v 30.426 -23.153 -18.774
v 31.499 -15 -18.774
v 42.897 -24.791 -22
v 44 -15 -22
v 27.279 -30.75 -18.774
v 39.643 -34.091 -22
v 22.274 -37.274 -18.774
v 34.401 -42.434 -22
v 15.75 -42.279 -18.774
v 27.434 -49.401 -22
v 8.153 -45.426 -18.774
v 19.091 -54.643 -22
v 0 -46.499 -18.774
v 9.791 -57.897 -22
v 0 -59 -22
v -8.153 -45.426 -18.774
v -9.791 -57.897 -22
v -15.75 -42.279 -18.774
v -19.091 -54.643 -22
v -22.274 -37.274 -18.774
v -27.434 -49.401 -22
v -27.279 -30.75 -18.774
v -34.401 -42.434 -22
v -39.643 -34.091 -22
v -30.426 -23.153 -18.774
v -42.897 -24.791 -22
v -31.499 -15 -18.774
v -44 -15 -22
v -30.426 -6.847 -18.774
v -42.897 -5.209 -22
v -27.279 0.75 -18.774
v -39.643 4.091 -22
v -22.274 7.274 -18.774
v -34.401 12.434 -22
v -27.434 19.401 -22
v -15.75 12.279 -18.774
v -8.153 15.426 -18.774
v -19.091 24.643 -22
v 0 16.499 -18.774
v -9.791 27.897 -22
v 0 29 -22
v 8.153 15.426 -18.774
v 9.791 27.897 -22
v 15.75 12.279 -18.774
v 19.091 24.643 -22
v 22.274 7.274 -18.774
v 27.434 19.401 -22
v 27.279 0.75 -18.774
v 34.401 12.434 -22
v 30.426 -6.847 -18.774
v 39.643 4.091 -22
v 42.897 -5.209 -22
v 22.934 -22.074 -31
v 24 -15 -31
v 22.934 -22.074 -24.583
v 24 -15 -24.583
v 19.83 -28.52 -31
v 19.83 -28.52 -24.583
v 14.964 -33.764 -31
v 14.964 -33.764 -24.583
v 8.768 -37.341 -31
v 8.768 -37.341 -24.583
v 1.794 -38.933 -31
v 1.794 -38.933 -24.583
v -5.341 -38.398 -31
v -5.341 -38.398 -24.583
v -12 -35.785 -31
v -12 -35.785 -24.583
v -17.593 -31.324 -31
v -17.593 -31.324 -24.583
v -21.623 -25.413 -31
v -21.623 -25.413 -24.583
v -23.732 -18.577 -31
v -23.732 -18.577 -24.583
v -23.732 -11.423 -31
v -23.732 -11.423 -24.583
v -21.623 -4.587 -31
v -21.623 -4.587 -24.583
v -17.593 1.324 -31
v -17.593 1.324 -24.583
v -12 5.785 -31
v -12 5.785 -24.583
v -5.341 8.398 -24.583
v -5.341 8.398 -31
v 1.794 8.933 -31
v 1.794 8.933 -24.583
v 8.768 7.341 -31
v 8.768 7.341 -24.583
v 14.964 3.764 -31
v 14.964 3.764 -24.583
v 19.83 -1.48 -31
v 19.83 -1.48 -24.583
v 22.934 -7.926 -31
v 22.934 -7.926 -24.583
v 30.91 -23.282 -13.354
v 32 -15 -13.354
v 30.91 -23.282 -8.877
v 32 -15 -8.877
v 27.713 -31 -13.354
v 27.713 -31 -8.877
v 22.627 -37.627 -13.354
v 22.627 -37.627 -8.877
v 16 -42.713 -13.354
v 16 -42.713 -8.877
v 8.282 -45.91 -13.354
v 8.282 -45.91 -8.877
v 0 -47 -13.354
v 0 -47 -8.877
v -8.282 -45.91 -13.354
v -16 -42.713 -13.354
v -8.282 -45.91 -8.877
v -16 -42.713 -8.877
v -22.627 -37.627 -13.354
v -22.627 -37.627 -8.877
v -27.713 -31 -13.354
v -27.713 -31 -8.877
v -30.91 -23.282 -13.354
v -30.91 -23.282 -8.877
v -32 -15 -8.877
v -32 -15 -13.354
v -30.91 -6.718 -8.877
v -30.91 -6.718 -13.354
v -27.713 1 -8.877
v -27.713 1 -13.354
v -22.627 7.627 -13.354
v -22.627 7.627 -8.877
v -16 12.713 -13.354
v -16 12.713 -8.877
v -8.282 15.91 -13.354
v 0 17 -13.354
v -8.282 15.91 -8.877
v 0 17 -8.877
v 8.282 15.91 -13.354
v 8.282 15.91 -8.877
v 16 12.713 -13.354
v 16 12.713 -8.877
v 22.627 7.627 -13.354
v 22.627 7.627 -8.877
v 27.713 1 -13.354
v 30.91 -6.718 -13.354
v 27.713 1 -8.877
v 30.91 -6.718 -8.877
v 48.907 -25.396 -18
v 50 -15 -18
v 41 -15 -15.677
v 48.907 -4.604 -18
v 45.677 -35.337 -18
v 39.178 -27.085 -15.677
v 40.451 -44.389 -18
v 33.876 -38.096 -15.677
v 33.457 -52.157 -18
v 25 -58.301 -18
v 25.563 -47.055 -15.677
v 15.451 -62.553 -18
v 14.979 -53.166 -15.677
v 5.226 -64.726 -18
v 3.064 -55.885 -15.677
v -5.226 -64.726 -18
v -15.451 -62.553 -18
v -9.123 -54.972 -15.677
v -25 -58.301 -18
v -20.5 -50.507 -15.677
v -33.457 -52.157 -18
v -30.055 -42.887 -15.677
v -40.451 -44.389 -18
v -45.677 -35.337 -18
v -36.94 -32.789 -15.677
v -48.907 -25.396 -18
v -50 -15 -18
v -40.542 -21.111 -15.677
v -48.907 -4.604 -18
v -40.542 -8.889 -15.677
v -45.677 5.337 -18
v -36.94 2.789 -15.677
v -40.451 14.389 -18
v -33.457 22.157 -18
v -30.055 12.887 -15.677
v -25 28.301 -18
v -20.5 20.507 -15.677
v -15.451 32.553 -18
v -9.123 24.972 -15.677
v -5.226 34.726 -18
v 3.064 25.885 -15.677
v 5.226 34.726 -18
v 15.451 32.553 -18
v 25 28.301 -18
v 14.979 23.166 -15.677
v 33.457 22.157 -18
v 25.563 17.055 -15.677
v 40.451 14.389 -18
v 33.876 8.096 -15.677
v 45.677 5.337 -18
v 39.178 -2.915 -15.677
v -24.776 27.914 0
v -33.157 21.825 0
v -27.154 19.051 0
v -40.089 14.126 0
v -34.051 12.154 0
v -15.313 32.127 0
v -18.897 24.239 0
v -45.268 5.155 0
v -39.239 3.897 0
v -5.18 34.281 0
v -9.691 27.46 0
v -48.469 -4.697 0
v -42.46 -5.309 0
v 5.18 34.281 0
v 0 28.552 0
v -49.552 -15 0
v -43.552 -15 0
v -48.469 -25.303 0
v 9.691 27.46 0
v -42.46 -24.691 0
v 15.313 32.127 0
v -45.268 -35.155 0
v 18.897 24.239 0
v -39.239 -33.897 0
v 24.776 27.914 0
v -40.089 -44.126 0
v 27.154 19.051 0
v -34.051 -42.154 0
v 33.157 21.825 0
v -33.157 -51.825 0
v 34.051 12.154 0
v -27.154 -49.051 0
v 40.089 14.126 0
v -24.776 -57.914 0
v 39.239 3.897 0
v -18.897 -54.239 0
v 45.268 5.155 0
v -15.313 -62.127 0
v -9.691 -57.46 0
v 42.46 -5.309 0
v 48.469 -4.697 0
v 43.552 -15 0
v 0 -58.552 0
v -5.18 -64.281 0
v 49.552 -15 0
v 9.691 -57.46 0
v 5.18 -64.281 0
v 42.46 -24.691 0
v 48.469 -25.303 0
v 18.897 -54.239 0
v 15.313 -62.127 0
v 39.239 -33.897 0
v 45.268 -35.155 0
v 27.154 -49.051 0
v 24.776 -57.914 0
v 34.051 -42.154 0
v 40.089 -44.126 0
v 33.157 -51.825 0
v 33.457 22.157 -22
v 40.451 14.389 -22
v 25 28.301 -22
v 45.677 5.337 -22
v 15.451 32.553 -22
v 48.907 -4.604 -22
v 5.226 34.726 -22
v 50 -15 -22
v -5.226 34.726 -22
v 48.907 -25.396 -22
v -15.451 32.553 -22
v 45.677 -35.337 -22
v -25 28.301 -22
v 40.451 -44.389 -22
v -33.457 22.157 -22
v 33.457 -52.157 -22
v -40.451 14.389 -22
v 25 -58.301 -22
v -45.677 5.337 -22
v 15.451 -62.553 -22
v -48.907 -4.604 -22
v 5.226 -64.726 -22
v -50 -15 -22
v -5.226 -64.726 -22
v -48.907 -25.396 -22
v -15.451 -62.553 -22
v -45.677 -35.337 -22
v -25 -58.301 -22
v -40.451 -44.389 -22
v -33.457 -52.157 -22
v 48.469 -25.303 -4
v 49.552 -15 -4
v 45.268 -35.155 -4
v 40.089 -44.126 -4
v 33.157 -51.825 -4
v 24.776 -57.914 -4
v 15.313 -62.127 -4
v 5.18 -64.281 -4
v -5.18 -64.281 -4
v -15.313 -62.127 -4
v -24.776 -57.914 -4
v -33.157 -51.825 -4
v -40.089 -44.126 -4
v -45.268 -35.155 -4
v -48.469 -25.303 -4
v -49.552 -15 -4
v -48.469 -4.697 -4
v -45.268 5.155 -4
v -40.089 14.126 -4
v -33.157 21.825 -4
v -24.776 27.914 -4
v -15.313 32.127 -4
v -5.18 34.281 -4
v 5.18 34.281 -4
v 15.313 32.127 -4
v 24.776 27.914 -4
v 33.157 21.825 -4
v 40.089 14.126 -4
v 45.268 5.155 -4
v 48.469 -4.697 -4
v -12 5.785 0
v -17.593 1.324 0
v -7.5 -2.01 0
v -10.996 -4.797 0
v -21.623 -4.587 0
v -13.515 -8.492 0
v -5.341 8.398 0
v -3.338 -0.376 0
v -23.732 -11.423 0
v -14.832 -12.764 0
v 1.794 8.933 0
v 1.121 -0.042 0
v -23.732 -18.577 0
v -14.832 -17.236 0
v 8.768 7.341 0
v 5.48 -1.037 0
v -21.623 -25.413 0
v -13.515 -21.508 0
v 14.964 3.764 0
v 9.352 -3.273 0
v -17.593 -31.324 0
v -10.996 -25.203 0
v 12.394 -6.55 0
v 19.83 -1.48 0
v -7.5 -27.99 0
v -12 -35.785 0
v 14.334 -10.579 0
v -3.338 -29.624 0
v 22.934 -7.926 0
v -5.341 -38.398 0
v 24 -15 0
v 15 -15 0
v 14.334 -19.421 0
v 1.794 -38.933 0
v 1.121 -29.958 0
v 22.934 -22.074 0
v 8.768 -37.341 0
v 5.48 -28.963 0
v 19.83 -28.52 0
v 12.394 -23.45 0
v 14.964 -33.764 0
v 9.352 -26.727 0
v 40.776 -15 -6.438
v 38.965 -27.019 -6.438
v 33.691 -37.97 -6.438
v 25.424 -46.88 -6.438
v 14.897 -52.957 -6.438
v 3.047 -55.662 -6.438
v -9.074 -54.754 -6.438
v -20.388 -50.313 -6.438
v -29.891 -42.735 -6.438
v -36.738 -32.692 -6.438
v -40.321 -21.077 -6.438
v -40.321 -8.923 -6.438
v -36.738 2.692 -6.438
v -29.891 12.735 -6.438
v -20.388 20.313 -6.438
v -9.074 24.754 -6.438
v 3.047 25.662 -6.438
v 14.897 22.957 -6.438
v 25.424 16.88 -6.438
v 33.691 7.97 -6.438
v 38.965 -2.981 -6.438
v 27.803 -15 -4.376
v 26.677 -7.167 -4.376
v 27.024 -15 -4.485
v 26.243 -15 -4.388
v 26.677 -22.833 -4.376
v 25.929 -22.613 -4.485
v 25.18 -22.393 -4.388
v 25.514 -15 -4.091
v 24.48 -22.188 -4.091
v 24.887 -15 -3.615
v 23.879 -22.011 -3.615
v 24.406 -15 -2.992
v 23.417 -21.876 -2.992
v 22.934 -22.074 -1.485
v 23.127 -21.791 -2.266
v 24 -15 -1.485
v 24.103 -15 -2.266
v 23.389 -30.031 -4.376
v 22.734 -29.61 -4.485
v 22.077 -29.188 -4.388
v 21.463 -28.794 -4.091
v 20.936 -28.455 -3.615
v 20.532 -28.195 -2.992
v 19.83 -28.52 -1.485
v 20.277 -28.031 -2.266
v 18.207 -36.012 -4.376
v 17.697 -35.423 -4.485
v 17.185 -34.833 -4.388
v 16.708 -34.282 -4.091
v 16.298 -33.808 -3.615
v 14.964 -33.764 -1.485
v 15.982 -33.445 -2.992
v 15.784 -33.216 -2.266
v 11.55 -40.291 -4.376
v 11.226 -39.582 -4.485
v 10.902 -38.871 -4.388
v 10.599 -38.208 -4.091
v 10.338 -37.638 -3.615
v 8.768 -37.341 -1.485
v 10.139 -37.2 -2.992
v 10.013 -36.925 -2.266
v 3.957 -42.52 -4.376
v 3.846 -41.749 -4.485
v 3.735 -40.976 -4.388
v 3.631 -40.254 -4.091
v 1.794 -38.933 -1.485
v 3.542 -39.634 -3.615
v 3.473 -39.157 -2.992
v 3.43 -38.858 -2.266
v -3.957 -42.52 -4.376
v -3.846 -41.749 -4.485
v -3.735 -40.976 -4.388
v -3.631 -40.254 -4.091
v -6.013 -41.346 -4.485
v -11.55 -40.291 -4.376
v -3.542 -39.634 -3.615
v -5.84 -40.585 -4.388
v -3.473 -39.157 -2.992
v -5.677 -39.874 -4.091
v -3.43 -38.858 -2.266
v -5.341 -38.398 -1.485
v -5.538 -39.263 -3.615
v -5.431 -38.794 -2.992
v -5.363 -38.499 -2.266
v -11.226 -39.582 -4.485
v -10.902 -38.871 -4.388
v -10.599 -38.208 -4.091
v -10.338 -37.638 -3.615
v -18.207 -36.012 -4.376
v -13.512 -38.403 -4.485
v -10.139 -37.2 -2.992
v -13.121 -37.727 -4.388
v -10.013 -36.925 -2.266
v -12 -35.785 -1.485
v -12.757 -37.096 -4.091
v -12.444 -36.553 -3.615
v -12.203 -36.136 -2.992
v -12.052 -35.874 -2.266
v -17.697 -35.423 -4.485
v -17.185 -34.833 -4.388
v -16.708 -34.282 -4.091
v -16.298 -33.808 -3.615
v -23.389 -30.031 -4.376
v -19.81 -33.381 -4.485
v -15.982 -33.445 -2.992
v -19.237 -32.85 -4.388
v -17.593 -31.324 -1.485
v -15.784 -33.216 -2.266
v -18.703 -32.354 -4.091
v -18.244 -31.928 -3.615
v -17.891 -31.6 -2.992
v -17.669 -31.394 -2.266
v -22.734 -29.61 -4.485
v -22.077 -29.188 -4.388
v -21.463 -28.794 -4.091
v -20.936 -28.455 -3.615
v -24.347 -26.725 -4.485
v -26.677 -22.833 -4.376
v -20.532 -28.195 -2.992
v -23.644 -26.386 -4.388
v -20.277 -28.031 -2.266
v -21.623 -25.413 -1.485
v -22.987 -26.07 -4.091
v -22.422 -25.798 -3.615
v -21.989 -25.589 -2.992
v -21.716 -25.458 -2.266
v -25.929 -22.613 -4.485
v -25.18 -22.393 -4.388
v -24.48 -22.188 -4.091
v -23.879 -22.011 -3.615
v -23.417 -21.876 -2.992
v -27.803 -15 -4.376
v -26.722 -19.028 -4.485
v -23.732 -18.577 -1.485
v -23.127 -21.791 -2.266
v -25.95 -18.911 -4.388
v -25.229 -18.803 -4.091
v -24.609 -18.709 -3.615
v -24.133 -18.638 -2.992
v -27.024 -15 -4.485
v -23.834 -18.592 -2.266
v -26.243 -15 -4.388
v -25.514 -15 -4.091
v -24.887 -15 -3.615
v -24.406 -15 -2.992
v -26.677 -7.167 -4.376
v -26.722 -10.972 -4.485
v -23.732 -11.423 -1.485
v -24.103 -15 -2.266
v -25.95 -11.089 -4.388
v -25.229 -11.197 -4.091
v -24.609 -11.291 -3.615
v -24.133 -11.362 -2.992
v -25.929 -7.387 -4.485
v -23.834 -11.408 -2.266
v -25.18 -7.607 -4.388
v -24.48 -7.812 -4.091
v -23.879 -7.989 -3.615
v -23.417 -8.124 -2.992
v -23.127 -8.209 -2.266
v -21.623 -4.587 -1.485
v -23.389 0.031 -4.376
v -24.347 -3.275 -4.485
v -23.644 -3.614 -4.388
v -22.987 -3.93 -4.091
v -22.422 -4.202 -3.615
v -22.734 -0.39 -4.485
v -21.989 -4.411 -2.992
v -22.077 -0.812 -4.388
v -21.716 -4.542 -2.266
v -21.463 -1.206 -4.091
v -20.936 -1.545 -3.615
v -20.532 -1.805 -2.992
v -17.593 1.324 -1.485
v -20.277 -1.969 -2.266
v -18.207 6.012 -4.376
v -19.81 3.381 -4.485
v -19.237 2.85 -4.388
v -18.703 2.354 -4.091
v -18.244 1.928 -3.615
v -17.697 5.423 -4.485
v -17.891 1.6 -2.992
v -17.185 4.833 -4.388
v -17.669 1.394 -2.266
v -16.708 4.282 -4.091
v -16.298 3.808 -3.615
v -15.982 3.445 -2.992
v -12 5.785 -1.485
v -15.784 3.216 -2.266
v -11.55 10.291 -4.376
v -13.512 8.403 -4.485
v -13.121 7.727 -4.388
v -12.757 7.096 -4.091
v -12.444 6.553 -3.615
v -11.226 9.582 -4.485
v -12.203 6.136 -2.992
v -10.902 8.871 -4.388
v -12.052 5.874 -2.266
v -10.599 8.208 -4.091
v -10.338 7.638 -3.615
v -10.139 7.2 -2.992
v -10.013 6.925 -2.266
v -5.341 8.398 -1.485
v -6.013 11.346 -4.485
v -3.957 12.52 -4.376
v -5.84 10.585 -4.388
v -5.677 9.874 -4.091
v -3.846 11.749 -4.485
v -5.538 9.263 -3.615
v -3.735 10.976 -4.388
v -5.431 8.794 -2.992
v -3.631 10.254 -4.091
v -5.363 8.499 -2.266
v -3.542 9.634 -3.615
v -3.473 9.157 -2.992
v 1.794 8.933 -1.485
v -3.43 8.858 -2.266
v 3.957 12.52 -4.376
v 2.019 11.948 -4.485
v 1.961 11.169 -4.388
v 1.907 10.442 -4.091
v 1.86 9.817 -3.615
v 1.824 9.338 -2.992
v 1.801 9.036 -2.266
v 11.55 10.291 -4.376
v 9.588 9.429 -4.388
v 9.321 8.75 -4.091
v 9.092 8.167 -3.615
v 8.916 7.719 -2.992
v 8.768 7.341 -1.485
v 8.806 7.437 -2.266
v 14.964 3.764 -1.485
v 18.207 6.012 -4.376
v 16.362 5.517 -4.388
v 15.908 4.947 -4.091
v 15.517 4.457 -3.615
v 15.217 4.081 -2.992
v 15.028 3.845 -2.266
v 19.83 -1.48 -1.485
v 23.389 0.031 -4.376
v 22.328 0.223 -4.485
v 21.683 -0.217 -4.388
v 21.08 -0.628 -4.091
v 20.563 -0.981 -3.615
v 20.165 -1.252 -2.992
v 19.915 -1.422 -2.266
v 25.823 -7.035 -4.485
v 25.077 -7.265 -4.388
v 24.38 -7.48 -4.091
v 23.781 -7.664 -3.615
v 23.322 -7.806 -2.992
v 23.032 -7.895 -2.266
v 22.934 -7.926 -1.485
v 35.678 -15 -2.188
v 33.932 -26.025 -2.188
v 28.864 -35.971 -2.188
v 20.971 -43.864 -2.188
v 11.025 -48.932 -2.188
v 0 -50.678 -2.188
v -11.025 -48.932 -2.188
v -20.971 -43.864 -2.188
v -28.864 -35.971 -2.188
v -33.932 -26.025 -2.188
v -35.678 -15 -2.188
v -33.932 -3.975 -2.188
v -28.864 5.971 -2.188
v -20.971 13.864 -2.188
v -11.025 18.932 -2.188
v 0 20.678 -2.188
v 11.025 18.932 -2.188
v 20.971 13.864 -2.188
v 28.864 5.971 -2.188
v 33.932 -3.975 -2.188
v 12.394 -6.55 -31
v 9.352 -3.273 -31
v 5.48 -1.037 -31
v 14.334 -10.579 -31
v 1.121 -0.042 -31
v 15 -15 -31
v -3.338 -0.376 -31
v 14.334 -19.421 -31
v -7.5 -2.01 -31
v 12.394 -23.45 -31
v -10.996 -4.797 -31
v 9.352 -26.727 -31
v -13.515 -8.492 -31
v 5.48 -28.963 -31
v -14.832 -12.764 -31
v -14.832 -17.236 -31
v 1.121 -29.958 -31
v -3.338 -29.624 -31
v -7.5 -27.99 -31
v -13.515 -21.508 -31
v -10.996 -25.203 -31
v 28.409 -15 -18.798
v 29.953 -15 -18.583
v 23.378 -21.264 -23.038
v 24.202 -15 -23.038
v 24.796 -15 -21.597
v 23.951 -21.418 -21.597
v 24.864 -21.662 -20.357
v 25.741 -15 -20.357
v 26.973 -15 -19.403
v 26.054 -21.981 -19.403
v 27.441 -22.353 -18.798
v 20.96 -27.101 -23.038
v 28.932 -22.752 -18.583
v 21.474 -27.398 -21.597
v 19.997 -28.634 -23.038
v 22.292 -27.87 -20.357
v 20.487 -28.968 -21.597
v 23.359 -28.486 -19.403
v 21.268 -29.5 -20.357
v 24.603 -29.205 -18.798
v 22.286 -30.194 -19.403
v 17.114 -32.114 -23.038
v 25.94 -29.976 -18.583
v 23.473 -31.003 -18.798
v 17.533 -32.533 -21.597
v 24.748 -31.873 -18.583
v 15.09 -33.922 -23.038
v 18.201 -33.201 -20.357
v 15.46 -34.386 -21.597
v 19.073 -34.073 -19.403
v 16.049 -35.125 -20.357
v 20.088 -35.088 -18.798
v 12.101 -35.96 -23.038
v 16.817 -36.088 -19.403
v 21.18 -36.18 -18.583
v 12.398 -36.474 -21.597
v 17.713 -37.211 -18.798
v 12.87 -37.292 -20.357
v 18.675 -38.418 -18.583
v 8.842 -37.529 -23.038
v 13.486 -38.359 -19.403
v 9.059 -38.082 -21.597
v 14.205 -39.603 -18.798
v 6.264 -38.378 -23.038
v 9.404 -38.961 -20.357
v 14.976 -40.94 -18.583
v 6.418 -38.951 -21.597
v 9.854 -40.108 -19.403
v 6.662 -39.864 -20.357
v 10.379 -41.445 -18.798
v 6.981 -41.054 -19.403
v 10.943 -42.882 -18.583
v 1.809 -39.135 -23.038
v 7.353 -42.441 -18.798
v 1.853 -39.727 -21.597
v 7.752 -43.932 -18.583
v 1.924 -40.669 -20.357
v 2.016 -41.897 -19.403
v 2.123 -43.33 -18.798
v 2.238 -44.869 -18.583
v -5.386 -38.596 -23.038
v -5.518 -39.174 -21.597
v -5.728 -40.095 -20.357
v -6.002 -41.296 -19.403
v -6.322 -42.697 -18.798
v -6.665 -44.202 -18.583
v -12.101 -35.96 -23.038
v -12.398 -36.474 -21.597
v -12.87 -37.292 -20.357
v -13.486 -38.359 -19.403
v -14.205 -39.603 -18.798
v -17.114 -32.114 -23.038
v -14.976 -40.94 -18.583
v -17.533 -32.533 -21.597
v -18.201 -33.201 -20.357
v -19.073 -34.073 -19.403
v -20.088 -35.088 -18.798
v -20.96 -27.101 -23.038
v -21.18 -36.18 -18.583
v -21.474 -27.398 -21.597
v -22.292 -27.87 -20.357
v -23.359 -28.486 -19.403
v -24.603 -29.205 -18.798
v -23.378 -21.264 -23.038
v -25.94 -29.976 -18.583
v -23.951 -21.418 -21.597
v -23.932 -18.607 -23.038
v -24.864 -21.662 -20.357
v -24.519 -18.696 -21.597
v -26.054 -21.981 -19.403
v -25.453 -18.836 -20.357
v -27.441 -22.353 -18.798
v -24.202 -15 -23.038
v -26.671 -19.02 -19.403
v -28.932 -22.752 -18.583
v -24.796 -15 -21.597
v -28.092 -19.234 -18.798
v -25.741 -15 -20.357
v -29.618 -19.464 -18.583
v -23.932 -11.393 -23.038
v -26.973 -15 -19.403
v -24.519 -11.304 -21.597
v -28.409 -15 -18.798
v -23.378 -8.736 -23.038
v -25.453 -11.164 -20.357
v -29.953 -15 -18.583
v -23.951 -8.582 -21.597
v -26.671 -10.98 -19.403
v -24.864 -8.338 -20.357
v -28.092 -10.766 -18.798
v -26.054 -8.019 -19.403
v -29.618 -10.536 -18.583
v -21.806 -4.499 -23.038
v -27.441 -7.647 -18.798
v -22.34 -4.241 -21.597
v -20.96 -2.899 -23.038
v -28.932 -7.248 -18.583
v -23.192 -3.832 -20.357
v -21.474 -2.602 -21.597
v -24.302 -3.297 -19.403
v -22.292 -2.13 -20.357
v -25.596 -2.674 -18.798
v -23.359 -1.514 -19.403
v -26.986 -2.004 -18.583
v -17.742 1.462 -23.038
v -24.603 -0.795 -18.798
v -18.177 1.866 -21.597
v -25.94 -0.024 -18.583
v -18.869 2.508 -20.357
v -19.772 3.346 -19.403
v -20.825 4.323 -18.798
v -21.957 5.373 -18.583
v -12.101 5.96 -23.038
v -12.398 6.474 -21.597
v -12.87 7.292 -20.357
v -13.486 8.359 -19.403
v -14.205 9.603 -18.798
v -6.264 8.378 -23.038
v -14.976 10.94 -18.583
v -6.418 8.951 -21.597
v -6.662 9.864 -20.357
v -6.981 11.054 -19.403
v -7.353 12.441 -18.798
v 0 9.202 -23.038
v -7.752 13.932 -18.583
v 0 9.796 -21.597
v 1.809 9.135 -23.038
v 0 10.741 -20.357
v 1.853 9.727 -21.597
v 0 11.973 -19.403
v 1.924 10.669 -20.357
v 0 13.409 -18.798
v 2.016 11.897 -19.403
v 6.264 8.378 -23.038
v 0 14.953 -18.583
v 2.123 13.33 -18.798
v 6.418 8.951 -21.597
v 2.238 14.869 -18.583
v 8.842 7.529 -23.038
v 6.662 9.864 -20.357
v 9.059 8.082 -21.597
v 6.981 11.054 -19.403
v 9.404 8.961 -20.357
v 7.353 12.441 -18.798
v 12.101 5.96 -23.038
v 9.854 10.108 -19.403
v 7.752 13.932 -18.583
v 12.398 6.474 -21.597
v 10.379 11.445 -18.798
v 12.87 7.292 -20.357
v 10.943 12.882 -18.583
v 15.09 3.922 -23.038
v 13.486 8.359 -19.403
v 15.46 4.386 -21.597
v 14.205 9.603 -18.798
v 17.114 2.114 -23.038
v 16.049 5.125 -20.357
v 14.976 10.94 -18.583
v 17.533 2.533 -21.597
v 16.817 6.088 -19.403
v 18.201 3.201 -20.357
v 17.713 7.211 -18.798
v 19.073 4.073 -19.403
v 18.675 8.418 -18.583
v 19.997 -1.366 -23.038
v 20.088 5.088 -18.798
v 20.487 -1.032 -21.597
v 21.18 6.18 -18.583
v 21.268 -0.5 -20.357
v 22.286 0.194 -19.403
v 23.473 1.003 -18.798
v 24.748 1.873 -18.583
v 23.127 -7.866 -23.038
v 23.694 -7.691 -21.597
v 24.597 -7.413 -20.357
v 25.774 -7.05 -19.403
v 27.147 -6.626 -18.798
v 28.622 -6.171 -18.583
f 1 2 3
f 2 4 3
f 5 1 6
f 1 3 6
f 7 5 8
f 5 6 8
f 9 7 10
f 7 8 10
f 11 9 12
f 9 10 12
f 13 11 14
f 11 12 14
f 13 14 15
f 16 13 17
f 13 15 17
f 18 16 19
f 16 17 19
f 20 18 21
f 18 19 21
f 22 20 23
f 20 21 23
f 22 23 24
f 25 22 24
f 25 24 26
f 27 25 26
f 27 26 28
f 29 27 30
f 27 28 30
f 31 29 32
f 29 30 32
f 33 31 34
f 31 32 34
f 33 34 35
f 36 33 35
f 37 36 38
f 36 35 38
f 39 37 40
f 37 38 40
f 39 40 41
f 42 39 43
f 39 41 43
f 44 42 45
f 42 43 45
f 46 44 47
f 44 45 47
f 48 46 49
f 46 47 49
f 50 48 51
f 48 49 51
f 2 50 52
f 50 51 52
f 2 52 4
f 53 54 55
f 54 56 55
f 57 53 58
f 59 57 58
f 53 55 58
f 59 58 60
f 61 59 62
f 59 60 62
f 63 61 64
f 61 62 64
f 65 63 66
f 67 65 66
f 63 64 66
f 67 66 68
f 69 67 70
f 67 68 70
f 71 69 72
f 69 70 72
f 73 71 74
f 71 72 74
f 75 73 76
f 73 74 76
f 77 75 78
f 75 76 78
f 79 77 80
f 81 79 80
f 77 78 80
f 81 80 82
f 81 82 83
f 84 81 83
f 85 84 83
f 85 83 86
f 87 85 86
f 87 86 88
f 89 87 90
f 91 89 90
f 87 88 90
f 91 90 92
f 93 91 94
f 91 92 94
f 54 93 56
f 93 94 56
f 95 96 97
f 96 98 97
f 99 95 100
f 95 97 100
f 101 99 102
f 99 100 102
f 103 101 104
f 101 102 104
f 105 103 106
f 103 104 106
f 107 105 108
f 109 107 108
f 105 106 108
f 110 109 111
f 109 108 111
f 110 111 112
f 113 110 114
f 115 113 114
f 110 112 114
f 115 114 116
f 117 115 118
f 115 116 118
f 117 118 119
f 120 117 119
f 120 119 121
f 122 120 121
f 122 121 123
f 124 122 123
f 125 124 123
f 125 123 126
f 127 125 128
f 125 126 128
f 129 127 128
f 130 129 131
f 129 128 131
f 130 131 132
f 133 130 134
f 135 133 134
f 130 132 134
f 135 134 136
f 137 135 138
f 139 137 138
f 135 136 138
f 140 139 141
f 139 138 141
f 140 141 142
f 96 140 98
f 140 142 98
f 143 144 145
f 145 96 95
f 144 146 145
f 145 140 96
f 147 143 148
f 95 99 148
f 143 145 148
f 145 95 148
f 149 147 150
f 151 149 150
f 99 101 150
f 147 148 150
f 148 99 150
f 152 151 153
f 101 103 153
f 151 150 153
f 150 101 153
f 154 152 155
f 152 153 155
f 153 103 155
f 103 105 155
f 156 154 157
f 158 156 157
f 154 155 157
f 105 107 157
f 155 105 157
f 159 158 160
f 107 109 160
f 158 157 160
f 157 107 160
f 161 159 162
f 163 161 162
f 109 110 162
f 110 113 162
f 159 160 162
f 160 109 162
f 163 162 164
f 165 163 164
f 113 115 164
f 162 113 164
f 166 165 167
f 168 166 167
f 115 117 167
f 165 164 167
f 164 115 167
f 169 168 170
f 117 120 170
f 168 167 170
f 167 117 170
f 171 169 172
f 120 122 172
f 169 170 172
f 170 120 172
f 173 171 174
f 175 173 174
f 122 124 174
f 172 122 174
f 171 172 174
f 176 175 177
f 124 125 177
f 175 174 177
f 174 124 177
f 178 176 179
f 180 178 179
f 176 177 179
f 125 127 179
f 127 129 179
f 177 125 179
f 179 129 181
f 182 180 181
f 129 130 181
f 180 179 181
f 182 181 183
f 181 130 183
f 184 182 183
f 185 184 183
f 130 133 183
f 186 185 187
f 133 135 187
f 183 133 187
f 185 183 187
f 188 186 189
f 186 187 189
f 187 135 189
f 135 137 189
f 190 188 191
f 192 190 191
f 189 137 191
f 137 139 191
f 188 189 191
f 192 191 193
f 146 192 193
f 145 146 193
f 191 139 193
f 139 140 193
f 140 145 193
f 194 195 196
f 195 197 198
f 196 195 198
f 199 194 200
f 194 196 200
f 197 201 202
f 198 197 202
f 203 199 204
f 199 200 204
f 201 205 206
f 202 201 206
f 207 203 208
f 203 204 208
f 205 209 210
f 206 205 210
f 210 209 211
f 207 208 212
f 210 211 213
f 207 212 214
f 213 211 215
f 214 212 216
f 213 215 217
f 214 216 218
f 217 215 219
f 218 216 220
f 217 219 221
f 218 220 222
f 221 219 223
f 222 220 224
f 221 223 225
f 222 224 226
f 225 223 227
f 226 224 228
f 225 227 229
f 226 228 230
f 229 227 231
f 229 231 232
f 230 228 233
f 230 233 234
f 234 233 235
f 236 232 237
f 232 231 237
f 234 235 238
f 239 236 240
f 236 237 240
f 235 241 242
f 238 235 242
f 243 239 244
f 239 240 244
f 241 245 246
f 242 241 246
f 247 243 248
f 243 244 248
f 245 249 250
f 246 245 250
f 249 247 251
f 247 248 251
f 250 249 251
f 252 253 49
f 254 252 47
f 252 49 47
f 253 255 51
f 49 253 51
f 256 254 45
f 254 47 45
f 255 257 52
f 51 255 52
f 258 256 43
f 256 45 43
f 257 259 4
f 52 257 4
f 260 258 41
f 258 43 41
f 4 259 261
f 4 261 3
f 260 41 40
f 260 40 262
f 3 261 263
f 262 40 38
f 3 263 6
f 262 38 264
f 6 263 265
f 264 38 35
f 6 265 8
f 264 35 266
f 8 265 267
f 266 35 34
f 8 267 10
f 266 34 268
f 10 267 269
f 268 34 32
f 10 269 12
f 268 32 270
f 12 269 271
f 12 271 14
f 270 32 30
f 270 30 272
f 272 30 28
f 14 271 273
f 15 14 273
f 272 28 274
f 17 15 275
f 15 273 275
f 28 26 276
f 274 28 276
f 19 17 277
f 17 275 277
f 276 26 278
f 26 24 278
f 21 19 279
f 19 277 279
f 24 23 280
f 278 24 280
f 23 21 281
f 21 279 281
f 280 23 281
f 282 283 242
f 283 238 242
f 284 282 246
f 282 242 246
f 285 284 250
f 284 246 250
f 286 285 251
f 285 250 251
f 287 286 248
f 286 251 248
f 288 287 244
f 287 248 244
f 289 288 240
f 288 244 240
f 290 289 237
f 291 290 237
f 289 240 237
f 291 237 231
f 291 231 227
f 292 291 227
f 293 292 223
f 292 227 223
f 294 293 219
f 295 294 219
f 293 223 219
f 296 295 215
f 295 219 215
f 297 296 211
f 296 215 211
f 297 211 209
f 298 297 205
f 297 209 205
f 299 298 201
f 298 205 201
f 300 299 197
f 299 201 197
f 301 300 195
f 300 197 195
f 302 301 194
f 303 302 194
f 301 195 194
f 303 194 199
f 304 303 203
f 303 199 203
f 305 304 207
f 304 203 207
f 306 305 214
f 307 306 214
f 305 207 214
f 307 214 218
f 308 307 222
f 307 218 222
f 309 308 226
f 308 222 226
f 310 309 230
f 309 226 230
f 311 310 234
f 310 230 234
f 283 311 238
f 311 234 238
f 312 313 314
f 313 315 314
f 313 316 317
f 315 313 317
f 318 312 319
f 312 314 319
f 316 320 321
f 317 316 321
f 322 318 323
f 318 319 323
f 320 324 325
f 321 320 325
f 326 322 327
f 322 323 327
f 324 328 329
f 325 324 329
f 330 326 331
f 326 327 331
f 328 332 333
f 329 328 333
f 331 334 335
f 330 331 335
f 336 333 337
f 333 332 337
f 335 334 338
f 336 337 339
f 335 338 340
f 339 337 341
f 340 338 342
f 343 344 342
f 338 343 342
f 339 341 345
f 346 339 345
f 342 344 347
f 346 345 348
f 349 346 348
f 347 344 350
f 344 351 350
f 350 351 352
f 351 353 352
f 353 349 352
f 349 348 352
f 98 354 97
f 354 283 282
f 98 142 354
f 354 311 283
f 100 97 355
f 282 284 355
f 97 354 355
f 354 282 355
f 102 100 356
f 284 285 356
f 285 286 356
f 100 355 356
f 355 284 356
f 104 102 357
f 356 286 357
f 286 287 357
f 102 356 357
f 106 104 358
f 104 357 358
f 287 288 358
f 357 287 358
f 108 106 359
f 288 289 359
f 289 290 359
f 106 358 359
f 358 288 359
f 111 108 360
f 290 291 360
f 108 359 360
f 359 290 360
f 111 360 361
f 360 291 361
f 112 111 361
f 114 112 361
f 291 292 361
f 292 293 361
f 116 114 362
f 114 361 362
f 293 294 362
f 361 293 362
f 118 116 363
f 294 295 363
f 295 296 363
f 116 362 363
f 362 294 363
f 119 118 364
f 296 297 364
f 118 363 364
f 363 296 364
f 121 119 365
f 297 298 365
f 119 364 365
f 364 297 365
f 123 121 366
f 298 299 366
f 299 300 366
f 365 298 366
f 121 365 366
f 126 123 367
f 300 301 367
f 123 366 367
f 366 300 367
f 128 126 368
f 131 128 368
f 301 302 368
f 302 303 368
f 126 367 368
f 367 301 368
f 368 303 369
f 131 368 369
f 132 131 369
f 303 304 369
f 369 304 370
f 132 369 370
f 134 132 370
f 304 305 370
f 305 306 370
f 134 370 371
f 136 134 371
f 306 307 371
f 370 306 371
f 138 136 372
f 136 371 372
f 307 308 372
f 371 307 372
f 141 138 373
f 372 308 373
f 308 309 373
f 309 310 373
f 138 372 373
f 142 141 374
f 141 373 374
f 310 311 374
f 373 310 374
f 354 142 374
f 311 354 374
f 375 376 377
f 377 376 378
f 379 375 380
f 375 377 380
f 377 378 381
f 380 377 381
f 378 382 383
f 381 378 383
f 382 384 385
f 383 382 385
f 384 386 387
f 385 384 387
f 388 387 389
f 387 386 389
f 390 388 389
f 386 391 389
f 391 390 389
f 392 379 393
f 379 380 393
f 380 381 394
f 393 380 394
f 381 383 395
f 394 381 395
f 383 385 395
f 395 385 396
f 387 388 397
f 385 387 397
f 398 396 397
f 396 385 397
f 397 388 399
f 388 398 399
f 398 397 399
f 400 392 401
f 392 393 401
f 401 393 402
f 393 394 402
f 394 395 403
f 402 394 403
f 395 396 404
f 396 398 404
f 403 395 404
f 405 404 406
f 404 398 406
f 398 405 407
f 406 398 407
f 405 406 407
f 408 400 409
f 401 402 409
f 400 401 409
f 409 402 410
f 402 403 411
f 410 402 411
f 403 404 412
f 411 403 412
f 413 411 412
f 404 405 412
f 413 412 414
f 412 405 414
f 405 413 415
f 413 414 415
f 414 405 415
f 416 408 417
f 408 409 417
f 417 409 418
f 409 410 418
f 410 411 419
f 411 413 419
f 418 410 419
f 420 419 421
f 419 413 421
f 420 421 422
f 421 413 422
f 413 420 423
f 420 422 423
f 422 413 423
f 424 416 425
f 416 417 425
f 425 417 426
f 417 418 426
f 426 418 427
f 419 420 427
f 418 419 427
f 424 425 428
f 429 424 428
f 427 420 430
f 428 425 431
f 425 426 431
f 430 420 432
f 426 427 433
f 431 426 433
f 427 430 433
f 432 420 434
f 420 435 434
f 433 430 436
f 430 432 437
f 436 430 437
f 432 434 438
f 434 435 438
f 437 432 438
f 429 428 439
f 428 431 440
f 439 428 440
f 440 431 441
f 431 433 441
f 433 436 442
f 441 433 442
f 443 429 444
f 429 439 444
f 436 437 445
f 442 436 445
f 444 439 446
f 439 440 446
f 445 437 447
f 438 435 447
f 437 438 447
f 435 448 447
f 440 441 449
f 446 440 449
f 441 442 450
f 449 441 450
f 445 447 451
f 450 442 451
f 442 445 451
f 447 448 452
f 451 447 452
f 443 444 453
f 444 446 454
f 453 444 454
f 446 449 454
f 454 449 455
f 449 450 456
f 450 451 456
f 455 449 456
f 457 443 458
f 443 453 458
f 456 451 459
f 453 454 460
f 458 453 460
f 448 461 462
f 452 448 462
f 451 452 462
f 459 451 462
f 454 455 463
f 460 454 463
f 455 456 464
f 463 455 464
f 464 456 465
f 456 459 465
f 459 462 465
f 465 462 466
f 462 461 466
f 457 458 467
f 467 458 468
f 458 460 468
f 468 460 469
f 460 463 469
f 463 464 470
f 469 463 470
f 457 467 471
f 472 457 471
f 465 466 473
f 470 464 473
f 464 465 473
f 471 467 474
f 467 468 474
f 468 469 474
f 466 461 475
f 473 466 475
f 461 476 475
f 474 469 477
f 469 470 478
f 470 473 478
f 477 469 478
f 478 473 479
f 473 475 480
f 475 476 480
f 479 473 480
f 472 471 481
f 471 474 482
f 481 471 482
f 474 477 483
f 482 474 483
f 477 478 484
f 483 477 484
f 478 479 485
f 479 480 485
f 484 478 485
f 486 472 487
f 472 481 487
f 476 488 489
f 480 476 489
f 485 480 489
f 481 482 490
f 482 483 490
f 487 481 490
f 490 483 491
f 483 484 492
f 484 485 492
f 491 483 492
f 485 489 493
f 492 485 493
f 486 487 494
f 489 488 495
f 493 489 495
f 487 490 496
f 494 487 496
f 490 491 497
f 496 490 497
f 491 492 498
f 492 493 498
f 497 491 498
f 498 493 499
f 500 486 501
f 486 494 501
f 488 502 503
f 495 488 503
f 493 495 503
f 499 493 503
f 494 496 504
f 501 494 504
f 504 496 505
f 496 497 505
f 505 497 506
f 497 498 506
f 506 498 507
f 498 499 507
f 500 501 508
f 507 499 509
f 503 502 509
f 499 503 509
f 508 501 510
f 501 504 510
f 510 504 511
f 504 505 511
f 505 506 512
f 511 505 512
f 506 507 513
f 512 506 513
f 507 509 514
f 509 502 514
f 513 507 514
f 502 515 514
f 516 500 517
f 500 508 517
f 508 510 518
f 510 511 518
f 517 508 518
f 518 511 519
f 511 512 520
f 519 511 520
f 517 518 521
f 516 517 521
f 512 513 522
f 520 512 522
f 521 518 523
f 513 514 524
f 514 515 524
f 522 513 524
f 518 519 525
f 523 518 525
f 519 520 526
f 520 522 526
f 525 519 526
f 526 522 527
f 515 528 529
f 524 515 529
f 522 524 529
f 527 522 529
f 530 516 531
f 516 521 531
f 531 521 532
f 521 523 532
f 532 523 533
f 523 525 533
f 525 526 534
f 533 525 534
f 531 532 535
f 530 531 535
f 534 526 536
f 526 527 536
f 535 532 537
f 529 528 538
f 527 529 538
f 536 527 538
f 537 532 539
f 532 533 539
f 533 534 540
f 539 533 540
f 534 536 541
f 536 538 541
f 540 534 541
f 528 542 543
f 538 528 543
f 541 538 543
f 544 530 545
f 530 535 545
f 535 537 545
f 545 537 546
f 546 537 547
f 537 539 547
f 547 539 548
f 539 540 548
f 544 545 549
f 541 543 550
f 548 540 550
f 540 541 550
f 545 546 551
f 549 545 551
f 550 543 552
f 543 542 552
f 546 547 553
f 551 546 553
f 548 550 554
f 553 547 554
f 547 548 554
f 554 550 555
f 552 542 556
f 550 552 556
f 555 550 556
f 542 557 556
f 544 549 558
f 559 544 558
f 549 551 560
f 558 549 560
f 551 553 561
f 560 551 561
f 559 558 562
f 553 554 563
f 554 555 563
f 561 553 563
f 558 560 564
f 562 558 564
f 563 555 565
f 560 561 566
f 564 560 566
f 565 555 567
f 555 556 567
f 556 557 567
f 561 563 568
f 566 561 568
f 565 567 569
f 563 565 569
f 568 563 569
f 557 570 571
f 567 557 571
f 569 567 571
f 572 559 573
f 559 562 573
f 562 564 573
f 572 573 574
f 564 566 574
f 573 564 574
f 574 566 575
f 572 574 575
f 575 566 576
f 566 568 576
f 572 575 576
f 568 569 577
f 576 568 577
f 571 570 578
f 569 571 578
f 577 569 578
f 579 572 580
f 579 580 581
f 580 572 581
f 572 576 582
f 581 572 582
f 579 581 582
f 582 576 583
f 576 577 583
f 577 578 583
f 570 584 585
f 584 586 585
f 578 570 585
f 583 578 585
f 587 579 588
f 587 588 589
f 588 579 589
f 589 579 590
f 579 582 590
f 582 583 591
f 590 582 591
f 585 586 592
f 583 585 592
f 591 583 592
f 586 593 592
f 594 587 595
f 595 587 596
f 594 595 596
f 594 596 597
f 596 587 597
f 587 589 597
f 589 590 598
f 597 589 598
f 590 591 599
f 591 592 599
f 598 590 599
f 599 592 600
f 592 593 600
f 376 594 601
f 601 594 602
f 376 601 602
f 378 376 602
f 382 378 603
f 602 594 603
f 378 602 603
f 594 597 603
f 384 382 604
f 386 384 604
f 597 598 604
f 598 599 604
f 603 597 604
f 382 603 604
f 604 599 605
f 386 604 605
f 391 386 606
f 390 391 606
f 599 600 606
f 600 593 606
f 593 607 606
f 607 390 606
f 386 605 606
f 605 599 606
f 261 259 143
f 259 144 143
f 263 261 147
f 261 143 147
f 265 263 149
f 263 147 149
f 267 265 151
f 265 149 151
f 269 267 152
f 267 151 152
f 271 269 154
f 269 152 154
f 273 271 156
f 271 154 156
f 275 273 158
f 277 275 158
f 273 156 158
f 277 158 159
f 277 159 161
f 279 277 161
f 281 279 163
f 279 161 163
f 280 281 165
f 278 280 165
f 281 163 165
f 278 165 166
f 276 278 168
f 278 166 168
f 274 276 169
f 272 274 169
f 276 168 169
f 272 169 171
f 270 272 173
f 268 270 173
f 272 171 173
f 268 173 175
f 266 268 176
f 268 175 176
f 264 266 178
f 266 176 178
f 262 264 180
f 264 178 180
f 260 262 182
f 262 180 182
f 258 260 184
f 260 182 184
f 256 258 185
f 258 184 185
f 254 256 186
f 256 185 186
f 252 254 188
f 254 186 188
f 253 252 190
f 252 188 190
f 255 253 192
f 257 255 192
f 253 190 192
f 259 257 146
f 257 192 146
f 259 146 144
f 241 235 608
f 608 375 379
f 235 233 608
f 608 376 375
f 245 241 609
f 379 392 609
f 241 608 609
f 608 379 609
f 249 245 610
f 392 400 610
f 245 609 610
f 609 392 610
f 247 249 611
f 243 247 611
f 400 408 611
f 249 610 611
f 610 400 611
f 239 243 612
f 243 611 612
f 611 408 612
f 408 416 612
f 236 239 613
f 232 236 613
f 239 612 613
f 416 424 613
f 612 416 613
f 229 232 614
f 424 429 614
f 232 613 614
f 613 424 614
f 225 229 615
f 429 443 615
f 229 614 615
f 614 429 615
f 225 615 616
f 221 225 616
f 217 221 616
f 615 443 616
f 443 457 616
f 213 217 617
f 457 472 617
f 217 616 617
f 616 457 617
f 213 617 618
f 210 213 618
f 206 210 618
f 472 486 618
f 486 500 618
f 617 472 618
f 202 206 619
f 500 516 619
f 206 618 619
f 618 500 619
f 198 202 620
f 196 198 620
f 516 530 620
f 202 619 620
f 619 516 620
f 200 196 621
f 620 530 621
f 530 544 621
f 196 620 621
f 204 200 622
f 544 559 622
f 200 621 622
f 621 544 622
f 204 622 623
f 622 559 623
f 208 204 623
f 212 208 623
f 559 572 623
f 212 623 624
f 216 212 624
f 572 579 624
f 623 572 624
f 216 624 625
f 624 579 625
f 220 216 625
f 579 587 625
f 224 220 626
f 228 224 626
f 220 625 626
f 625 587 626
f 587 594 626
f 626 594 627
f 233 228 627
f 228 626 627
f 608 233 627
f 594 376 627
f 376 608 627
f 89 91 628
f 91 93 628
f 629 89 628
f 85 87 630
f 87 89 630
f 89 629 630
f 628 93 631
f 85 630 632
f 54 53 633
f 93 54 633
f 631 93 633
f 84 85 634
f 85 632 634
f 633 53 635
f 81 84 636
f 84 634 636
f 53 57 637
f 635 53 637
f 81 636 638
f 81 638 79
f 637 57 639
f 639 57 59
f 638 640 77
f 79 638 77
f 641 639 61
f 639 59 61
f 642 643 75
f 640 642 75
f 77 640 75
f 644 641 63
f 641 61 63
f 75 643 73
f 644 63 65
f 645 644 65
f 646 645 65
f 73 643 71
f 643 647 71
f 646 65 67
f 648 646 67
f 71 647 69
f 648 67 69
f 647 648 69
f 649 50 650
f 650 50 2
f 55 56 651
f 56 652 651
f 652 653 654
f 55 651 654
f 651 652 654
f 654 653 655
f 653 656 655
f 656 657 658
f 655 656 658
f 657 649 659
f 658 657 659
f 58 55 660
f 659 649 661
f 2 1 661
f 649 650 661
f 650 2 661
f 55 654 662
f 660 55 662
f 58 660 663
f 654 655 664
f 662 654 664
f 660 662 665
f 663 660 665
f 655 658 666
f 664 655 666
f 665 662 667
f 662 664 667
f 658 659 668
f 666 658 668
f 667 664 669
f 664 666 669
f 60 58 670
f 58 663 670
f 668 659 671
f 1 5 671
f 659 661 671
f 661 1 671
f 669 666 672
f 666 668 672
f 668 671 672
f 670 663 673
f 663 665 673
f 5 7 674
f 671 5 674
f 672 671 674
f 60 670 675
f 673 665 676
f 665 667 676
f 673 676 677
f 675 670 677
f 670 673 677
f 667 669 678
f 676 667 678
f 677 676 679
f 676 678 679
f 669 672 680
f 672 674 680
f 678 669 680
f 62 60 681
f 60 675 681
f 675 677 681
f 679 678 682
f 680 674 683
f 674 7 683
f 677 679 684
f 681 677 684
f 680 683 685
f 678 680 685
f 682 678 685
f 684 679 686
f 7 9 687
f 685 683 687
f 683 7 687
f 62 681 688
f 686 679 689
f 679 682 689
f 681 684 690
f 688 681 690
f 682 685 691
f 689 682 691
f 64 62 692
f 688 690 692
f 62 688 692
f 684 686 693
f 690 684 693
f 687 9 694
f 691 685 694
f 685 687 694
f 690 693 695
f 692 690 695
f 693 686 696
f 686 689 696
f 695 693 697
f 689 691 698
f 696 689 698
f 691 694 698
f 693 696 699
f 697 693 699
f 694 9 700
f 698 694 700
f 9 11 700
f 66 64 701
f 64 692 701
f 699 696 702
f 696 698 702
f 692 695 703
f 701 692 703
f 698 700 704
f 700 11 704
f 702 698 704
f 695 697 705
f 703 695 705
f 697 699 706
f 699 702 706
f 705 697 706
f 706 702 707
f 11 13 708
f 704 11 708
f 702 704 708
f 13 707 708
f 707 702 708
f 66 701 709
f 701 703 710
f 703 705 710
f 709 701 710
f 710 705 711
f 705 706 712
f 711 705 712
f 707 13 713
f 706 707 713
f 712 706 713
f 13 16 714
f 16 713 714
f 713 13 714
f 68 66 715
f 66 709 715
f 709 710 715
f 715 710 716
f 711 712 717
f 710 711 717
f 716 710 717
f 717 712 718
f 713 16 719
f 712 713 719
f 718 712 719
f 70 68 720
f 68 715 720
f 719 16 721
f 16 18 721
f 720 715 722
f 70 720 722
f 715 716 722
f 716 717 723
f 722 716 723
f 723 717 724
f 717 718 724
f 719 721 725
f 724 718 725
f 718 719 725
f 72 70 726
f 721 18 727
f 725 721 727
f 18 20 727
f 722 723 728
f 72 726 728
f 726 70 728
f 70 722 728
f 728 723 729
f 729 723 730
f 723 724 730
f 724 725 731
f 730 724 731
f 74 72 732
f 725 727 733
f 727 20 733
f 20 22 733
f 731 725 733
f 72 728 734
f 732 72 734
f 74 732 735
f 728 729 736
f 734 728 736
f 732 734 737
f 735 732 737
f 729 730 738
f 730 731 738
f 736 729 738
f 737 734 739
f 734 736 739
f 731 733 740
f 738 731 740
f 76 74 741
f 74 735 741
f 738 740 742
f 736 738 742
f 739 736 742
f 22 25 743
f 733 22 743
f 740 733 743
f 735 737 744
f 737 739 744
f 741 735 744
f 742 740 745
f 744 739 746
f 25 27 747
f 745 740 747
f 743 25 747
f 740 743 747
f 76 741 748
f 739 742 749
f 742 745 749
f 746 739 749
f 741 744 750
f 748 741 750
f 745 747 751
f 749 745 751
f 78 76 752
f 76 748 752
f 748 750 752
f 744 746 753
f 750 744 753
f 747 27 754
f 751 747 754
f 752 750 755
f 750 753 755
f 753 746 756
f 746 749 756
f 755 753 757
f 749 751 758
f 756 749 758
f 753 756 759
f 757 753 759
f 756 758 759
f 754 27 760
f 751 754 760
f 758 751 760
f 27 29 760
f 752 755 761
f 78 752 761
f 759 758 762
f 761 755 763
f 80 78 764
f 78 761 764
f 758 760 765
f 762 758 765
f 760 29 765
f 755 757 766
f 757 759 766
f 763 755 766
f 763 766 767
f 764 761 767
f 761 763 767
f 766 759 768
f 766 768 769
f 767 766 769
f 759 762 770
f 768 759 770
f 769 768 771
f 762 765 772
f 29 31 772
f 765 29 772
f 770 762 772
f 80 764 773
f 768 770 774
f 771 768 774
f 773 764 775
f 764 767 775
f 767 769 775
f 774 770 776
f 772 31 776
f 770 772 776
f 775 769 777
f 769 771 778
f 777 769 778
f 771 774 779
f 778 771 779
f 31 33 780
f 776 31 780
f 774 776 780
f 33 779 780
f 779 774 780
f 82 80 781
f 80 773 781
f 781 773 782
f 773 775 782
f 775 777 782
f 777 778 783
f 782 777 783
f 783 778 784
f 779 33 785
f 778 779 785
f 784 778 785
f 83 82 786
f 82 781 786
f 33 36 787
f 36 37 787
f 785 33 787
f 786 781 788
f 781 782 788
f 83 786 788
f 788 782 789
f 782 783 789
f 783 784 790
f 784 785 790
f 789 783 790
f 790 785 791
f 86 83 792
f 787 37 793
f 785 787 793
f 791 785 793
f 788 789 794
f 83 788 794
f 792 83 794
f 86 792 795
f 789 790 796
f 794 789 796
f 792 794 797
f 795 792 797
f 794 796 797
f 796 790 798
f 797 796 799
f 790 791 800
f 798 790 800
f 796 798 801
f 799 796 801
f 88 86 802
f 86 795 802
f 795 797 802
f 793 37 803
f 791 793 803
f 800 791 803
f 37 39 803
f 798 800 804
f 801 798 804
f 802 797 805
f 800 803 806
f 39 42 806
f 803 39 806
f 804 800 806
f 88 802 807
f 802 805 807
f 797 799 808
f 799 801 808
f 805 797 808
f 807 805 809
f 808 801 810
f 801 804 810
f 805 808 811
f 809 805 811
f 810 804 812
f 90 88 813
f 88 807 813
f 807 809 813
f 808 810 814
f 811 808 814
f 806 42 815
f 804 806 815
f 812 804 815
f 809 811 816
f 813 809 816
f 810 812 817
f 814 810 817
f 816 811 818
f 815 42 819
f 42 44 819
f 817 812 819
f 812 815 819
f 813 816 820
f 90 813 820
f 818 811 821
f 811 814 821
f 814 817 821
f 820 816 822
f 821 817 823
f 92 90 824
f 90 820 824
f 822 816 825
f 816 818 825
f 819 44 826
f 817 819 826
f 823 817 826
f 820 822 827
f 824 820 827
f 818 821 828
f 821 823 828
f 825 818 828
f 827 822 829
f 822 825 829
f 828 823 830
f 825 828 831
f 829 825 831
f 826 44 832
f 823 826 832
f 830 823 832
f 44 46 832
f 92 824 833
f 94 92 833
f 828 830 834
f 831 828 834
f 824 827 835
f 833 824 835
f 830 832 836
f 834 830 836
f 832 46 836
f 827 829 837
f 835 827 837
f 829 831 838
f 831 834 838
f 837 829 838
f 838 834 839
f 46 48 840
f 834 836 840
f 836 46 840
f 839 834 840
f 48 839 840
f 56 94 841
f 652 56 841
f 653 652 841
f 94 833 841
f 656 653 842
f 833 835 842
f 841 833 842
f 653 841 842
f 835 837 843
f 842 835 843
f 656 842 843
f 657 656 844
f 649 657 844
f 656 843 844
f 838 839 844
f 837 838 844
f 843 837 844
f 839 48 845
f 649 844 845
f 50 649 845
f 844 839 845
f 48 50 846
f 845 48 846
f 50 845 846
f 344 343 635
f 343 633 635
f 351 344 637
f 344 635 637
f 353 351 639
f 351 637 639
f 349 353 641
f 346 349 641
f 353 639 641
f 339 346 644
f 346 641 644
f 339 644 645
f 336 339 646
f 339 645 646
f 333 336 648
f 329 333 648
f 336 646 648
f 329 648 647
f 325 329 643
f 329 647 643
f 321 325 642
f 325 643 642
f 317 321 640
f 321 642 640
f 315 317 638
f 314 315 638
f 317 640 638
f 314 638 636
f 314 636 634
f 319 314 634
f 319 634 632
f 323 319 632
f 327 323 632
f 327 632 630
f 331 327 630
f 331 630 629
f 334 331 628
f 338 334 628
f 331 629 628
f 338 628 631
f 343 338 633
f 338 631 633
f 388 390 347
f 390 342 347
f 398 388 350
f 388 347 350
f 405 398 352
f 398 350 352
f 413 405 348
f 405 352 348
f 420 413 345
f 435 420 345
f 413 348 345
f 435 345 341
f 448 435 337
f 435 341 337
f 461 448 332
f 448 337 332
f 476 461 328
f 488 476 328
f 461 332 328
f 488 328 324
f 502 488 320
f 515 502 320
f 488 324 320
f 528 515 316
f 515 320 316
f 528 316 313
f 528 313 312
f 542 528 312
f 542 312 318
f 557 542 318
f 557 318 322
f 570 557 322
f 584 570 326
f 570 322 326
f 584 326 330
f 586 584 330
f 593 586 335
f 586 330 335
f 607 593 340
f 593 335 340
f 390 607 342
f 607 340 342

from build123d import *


with BuildPart() as part:
    # Sketch2 → Revolve2 (revolve)
    with BuildSketch(Plane(origin=(0, 0, 0), x_dir=(0, 0, -1), z_dir=(1, 0, 0)), mode=Mode.PRIVATE) as revolve2_sk:
        with BuildLine():
            Line((0, 0), (31, 0))
            Line((31, 0), (31, 9))
            Line((31, 9), (24.583151623, 9))
            ThreePointArc((24.583151623, 9), (19.839895343, 11.325558565), (18.773545819, 16.499493381))
            Line((18.773545819, 16.499493381), (22, 29))
            Line((22, 29), (22, 35))
            Line((22, 35), (18, 35))
            Line((18, 35), (13.354094276, 17))
            Line((13.354094276, 17), (8.876757203, 17))
            Line((8.876757203, 17), (4, 34.552318614))
            Line((4, 34.552318614), (0, 34.552318614))
            Line((0, 34.552318614), (0, 28.552318614))
            Line((0, 28.552318614), (4.37578125, 12.803101771))
            ThreePointArc((4.37578125, 12.803101771), (3.873716269, 10.184690841), (1.485274798, 9))
            Line((1.485274798, 9), (0, 9))
            Line((0, 9), (0, 0))
        make_face()
    revolve(revolve2_sk.sketch.rotate(Axis((0, -15, 0), (0, 0, -1)), 90), axis=Axis((0, -15, 0), (0, 0, -1)))


solid = part.part
